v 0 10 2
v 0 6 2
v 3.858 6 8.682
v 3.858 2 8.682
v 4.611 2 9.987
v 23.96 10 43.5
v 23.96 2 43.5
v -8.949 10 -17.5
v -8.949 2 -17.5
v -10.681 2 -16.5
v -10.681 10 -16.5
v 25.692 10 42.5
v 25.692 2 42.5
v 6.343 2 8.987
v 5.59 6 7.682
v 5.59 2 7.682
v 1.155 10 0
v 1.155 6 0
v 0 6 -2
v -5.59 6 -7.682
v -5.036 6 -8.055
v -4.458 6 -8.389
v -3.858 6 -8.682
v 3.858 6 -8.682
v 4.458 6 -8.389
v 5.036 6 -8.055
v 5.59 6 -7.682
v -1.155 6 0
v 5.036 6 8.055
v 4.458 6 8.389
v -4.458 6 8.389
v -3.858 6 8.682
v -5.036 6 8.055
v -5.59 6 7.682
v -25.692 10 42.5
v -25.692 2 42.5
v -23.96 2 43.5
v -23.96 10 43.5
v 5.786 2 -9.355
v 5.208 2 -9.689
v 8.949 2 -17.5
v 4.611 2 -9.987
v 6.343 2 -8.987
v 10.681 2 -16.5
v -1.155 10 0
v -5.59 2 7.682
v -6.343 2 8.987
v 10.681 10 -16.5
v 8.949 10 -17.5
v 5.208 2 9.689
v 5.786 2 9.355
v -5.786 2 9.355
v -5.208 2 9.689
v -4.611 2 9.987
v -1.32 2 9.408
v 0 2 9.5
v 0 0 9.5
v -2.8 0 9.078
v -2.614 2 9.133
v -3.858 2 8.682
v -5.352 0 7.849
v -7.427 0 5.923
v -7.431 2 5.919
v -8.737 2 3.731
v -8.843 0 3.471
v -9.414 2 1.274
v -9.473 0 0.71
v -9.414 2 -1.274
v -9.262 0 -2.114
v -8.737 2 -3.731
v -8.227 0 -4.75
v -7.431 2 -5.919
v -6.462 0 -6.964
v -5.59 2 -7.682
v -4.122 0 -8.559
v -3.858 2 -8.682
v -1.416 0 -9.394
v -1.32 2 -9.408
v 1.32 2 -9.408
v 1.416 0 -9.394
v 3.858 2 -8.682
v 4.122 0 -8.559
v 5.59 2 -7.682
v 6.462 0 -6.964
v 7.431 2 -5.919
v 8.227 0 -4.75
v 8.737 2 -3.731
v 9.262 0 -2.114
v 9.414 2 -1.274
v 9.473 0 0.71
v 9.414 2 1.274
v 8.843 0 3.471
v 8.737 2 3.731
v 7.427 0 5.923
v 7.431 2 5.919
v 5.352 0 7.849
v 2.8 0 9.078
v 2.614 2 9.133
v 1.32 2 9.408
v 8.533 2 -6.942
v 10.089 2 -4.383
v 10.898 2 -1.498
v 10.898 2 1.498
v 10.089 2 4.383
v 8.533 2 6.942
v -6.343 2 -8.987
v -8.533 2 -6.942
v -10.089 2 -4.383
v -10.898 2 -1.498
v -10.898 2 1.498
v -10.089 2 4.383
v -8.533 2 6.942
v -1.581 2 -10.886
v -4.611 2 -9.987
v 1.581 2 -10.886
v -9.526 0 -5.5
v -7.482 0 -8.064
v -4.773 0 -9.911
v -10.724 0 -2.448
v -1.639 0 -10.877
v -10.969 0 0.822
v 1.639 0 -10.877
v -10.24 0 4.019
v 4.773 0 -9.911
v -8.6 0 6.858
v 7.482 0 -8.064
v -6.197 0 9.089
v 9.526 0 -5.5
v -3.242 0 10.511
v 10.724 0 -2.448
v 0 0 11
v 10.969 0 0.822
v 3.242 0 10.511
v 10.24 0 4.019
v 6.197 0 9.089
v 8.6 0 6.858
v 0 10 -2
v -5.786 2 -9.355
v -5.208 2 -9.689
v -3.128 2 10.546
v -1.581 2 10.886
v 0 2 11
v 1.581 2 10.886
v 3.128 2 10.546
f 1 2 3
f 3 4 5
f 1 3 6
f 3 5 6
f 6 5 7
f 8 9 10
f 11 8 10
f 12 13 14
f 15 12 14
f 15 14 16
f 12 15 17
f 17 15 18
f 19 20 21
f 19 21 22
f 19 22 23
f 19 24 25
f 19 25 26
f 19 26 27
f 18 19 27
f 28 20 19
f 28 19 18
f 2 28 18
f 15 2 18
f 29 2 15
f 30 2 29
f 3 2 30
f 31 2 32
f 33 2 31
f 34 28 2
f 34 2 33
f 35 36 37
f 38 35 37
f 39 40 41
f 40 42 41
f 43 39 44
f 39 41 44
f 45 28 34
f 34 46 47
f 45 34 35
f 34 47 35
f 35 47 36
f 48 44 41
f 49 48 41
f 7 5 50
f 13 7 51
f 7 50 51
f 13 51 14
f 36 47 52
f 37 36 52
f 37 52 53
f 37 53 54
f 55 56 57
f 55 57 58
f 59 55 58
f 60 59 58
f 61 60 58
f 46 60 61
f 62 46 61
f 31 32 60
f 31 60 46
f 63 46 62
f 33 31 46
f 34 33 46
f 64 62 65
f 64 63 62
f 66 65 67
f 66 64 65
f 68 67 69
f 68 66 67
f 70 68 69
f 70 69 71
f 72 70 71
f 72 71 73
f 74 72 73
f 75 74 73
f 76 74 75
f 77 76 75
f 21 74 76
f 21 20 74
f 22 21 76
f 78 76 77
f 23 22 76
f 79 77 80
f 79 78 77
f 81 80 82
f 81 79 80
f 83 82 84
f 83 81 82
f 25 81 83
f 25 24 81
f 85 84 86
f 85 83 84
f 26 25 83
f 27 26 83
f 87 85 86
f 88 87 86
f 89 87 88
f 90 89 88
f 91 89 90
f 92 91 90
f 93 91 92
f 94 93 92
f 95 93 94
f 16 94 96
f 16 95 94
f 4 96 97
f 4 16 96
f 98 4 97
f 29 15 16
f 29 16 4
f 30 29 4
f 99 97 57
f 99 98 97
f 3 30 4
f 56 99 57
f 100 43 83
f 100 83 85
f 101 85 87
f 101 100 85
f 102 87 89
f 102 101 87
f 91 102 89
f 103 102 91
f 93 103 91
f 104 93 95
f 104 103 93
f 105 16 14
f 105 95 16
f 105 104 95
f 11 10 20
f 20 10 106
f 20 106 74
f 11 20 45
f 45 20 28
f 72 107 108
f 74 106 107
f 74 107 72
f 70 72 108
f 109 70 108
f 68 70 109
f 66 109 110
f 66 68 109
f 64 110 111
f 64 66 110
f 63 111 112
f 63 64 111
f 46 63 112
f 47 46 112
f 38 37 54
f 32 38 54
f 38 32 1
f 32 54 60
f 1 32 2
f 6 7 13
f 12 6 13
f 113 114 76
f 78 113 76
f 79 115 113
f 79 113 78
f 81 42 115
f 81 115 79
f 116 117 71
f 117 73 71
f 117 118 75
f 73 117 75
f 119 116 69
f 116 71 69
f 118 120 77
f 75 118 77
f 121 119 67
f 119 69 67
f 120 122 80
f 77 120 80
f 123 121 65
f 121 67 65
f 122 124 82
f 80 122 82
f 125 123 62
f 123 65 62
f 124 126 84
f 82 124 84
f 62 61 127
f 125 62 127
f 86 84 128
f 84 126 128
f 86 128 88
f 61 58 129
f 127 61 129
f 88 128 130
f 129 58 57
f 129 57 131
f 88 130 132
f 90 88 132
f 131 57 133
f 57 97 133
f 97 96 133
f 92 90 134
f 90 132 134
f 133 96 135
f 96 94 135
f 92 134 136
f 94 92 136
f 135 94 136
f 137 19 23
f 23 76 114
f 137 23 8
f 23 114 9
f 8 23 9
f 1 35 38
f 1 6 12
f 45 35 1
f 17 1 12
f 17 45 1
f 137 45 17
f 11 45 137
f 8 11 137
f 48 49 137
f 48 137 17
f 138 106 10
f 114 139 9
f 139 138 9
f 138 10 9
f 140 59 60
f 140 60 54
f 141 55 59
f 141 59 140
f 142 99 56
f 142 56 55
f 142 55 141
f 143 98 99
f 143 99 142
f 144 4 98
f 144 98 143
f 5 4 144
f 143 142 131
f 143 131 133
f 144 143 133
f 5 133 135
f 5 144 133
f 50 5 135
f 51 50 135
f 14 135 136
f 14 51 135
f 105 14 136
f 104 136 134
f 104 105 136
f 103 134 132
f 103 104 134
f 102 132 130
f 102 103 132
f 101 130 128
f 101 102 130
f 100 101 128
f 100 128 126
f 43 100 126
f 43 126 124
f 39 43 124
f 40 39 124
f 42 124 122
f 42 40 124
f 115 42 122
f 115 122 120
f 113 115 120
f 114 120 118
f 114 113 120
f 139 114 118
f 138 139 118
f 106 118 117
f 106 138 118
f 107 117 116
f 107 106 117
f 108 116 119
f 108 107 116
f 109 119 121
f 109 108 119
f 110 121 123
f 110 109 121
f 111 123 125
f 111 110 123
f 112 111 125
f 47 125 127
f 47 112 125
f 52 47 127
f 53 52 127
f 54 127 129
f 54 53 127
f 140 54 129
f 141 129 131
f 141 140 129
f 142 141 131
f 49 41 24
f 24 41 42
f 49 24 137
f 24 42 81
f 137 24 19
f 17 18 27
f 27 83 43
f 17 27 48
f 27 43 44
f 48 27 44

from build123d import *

# Parameters (mm, degrees)
SKETCH1_R           = 11
SKETCH1_R_2         = 9.5
BOSS_EXTRUDE1_DEPTH = 2
EXTRUDE_THIN1_DEPTH = 8
CUT_EXTRUDE1_START  = -6
SKETCH3_R           = 9.5
CUT_EXTRUDE1_DEPTH  = 6


with BuildPart() as part:
    # Sketch1 → Boss-Extrude1 (new body)
    with BuildSketch(Plane(origin=(0, 2, 0), x_dir=(1, 0, 0), z_dir=(0, 1, 0))):
        with Locations(Location((0, 0, 0), (0, 0, 270))):
            Circle(SKETCH1_R)
        with Locations(Location((0, 0, 0), (0, 0, 270))):
            Circle(SKETCH1_R_2, mode=Mode.SUBTRACT)
    extrude(amount=-BOSS_EXTRUDE1_DEPTH)

    # Sketch2 → Extrude-Thin1 (add)
    with BuildSketch(Plane(origin=(0, 2, 0), x_dir=(1, 0, 0), z_dir=(0, 1, 0))):
        Polygon((-23.960036171, -43.5), (10.68097998, 16.5), (8.948929172, 17.5), (-25.692086979, -42.5), align=None)
        Polygon((-10.68097998, 16.5), (23.960036171, -43.5), (25.692086979, -42.5), (-8.948929172, 17.5), align=None)
    extrude(amount=EXTRUDE_THIN1_DEPTH)

    # Sketch3 → Cut-Extrude1 (cut)
    with BuildSketch(Plane.XZ.offset(CUT_EXTRUDE1_START)):
        with Locations(Location((0, 0, 0), (0, 0, 90))):
            Circle(SKETCH3_R)
    extrude(amount=CUT_EXTRUDE1_DEPTH, mode=Mode.SUBTRACT)


solid = part.part
